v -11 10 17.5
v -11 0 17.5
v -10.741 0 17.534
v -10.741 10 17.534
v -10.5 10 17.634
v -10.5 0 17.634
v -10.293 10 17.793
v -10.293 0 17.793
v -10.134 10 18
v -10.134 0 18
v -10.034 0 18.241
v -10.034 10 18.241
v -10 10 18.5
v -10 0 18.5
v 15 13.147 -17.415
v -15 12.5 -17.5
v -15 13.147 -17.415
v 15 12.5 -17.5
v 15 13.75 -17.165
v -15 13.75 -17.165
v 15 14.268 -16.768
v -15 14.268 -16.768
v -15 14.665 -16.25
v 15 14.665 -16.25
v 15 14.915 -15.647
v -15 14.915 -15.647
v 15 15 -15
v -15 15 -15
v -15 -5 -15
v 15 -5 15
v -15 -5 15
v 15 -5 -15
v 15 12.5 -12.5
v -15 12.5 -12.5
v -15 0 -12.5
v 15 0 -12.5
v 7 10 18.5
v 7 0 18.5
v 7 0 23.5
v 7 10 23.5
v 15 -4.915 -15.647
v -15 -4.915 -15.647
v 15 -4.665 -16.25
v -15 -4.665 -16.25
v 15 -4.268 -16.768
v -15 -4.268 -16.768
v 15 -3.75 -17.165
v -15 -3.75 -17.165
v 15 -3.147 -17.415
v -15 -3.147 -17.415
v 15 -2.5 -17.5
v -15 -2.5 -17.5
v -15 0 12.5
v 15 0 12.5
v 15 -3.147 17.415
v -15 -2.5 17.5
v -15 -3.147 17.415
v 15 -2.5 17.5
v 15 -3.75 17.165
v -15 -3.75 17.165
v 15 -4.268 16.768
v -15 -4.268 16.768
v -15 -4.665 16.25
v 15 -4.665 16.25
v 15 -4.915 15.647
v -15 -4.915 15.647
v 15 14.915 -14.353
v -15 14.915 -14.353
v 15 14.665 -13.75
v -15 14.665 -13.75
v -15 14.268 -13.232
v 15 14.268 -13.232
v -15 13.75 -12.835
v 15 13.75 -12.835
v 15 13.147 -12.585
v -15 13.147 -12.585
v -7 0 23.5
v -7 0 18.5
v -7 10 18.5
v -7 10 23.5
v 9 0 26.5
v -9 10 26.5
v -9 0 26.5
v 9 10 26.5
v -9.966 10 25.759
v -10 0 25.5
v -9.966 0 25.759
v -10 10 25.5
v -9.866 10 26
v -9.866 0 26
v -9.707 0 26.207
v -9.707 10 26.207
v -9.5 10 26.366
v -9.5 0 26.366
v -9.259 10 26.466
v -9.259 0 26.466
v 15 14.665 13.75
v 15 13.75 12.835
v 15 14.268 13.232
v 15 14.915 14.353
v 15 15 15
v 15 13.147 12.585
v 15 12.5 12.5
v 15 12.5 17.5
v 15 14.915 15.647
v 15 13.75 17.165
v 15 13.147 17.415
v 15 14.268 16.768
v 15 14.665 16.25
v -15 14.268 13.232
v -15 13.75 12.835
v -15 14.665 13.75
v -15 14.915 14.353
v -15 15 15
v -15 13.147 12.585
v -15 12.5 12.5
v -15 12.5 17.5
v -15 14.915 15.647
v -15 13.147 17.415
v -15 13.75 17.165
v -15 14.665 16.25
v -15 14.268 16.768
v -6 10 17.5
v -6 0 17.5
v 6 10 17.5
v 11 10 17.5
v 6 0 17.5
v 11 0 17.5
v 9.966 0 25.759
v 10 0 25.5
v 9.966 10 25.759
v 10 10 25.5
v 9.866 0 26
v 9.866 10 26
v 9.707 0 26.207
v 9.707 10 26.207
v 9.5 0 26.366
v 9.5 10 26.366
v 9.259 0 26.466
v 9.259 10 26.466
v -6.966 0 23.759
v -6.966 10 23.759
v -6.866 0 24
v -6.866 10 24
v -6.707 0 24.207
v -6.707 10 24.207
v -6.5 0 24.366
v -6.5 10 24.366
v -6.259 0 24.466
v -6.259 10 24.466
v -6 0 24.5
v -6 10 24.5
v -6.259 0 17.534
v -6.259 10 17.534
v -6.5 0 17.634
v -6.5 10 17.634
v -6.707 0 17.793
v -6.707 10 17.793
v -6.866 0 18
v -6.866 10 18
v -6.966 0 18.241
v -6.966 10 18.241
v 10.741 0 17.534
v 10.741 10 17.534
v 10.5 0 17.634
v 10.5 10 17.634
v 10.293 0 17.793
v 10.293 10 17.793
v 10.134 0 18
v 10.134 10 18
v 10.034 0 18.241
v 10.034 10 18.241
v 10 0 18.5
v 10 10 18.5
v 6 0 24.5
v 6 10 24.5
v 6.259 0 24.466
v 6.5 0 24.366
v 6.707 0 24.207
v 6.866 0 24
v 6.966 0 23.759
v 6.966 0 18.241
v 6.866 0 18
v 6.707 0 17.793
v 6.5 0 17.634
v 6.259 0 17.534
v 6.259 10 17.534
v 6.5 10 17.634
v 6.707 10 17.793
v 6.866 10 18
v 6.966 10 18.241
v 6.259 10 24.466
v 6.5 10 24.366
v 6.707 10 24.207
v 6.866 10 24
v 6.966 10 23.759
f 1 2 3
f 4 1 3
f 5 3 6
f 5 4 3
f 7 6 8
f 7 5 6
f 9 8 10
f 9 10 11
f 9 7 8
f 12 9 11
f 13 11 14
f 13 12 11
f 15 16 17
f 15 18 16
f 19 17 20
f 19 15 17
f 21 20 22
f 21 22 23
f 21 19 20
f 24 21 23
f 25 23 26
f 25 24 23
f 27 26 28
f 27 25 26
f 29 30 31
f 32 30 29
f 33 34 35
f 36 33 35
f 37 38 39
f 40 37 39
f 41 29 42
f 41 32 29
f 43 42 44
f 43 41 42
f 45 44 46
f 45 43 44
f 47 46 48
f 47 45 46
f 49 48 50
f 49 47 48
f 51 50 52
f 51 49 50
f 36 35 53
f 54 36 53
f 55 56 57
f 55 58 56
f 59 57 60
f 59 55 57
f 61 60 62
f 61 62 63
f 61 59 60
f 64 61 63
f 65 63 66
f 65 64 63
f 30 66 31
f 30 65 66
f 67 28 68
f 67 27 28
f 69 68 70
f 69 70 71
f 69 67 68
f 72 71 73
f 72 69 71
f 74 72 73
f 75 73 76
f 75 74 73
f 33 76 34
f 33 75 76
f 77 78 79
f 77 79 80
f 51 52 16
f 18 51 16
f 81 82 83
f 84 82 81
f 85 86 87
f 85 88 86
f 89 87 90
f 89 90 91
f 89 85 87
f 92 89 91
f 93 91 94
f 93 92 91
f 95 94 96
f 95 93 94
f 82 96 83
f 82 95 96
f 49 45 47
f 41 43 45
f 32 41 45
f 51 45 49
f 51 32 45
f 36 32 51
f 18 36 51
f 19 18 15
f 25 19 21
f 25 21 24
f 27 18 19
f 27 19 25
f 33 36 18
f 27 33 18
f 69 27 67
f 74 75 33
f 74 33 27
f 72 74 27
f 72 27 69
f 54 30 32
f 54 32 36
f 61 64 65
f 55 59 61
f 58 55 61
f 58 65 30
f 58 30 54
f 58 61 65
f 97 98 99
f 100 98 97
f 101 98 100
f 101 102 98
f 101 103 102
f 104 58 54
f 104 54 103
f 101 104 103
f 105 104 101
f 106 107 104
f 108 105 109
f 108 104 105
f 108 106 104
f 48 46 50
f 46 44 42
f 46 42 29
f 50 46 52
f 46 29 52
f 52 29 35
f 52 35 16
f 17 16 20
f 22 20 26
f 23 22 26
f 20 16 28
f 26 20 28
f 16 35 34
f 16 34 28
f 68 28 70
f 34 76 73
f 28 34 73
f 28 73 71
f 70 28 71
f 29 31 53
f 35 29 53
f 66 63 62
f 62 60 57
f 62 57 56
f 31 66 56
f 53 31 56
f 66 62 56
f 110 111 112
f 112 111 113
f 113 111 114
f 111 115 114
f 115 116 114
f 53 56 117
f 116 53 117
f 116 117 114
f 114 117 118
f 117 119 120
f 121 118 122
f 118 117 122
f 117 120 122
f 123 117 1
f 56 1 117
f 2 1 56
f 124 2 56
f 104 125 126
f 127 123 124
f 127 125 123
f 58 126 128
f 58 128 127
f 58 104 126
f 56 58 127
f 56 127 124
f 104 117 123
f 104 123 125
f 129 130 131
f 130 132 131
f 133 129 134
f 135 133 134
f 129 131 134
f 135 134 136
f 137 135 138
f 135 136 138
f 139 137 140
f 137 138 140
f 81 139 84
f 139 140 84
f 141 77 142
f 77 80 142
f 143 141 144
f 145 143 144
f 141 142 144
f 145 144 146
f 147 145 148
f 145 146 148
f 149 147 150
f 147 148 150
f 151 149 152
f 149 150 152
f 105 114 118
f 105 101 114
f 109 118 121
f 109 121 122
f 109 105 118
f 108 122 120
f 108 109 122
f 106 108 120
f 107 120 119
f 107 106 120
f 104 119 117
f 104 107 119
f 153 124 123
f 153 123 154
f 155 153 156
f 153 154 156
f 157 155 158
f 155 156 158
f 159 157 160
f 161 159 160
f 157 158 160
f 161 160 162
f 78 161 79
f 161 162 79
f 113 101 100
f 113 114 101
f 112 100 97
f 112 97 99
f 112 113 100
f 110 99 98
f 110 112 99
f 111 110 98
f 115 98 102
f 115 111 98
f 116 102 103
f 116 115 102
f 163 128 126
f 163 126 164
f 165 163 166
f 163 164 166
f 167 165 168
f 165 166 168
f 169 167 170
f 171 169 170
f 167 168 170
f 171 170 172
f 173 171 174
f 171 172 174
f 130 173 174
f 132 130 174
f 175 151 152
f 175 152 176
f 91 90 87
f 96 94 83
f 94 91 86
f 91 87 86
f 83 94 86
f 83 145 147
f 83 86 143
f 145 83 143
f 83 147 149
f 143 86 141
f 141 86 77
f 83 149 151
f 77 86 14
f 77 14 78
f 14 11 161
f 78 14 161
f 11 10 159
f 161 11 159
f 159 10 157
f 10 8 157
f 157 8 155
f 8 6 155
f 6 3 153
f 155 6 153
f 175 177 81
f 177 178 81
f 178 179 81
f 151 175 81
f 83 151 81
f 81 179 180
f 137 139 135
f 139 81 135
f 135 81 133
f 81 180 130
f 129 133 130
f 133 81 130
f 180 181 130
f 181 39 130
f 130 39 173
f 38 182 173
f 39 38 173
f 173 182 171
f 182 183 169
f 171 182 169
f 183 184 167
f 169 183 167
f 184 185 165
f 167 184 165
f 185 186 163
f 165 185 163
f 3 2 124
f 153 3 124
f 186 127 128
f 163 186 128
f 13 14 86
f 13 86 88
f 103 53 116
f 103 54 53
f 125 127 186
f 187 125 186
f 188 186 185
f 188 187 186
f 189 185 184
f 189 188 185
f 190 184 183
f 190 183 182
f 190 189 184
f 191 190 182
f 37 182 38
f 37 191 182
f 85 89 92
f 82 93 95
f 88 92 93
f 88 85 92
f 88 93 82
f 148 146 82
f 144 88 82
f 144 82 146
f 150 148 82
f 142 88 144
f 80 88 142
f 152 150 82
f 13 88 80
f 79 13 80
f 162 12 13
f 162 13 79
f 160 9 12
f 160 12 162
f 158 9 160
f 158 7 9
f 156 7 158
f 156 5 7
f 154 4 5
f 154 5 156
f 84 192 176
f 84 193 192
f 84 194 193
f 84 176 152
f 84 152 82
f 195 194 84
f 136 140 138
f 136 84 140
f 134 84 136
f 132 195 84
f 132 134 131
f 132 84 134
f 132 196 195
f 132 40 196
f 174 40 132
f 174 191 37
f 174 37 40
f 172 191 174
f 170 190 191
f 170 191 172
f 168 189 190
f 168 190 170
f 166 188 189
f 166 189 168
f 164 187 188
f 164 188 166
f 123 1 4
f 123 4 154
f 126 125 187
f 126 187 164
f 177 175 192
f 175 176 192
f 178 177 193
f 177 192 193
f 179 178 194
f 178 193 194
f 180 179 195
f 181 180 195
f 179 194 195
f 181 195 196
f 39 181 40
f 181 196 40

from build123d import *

# Parameters (mm, degrees)
F1_DEPTH = 15
F2_W     = 20
F2_H     = 10
F3_DEPTH = 9
F4_R     = 2.49999
F5_W     = 14
F5_H     = 7
F6_DEPTH = 10
F7_R     = 1


# Not quite as in the source:
# - a fillet or chamfer is up to 0.001 mm smaller than in the source, because OpenCascade refuses the exact size


with BuildPart() as f1:
    # F0 (on Right) → F1 (new body, symmetric)
    with BuildSketch(Plane.YZ):
        Polygon((15, 12.5), (15, 17.5), (-5, 17.5), (-5, -17.5), (15, -17.5), (15, -12.5), (0, -12.5), (0, 12.5), align=None)
    extrude(amount=F1_DEPTH, both=True)

    # F2 (on face) → F3 (join)
    with BuildSketch(Plane.XY.offset(17.5)):
        with Locations((0, 5)):
            Rectangle(F2_W, F2_H)
    extrude(amount=F3_DEPTH)

    # F4 (radius 2.5 in the source; OpenCascade refuses exactly that, so slightly less here)
    f4_edges = [f1.edges().sort_by_distance(p)[0] for p in [
        (0, 15, 12.5),
        (0, 15, -12.5),
        (0, 15, 17.5),
        (0, 15, -17.5),
        (0, -5, 17.5),
        (0, -5, -17.5),
    ]]
    fillet(f4_edges, radius=F4_R)

    # F5 (on face) → F6 (cut, through all)
    with BuildSketch(Plane.XZ):
        with Locations((0, 21)):
            Rectangle(F5_W, F5_H)
    extrude(amount=-F6_DEPTH, mode=Mode.SUBTRACT)

    # F7
    f7_edges = [f1.edges().sort_by_distance(p)[0] for p in [
        (-7, 5, 17.5),
        (-7, 5, 24.5),
        (7, 5, 17.5),
        (7, 5, 24.5),
        (-10, 5, 17.5),
        (-10, 5, 26.5),
        (10, 5, 26.5),
        (10, 5, 17.5),
    ]]
    fillet(f7_edges, radius=F7_R)


solid = f1.part
